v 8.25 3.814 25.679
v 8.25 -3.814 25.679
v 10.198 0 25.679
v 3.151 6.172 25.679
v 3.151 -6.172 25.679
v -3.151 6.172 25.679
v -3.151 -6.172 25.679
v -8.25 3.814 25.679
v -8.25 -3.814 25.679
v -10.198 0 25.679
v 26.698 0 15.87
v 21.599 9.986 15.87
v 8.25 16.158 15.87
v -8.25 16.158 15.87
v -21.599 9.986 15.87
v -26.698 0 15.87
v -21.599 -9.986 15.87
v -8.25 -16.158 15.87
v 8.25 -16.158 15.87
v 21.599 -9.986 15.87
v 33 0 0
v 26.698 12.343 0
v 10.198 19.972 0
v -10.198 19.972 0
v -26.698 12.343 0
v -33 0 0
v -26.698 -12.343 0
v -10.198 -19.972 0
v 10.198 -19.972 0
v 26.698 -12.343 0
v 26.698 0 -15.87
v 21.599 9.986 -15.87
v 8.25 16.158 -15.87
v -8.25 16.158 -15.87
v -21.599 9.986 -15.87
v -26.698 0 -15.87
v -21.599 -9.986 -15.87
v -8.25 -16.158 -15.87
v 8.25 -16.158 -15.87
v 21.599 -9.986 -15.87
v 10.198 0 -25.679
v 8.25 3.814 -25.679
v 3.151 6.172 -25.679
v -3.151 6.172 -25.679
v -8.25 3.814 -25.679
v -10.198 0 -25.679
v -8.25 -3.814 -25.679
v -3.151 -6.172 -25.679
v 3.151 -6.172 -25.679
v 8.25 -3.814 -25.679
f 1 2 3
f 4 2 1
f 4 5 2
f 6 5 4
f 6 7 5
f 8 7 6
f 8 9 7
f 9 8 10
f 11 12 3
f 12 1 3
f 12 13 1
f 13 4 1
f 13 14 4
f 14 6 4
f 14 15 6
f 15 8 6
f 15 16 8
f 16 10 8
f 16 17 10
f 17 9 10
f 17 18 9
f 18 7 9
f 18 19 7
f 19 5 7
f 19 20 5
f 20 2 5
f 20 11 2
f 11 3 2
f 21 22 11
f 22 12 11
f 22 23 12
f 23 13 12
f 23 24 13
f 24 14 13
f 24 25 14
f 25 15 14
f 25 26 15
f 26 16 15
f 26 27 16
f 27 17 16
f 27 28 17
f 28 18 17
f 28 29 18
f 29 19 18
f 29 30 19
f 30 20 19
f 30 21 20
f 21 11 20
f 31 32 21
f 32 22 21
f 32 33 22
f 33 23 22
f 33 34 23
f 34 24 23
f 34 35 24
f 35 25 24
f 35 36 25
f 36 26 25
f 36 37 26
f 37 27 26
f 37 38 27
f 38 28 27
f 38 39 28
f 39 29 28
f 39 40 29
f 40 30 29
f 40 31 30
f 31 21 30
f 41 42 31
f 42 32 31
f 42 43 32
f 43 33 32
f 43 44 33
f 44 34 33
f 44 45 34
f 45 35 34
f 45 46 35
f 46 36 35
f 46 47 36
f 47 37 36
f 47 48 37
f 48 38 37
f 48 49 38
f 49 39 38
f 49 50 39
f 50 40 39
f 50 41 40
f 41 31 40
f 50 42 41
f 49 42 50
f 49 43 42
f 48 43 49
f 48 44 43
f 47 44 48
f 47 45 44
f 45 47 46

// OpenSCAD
// Generated by SolidPython 1.0.1 on 2020-07-29 00:46:49


scale(v = [11, 7, 9]) {
	sphere(r = 3);
}
/***********************************************
*********      SolidPython code:      **********
************************************************
 
# import packages: SolidPython
from solid import *
from solid.utils import *
from itertools import chain, combinations, permutations


class Resize:

    def __init__(self, scad_file):
        self.scad_file = scad_file
        #self.scad_file = import_scad(scad_file)
        # cone/cylinder param:
        self.r1 = 0
        self.r2 = 0
        self.h = 0
        # rectangular prism param:
        self.w = 0
        self.l = 0
        # ellipse param:
        self.r = 0

    # import OpenScad code (file name corresponds to shape)


    # classify shape + parameters
    def assign(self, param1, param2, param3):
        if self.scad_file == 'cone.scad':
            self.r1 = param1
            self.r2 = param2
            self.h = param3
        elif self.scad_file == 'cylinder.scad':
            self.r1 = param1
            self.r2 = param2
            self.h = param3
        elif self.scad_file == 'rectangularPrism.scad':
            self.h = param1
            self.l = param2
            self.w = param3
        else:
            self.r = param1
            self.h = param2

    # resize parameters
    def iterate(self):
        x = range(3, 20, 2)
        i = 1
        if self.scad_file == 'cone.scad':
            tempList = list(permutations(x, 2))
            for temp in tempList:
                param1 = temp[0]
                param2 = temp[1]
                filepath = 'produced_scad_files/' + 'cone' + str(param1) + '_' + str(param2) + '_' + '.scad'
                scad_render_to_file(cylinder(h=param1, r1=param2, r2=0), filepath)

        elif self.scad_file == 'cylinder.scad':
            tempList = list(permutations(x, 3))
            for temp in tempList:
                param1 = temp[0]
                param2 = temp[1]
                filepath = 'produced_scad_files/' + 'cylinder' + str(param1) + '_' + str(param2) + '_' + '.scad'
                scad_render_to_file(cylinder(h=param1, r1=param2, r2=param2), filepath)

        elif self.scad_file == 'rectangularPrism.scad':
            tempList = list(permutations(x, 3))
            for temp in tempList:
                param1 = temp[0]
                param2 = temp[1]
                param3 = temp[2]
                filepath = 'produced_scad_files/' + 'rectangularPrism' + str(param1) + '_' + str(param2) + '_' + str(
                    param3) + '.scad'
                scad_render_to_file(cube(size=(param1, param2, param3)), filepath)

        elif self.scad_file == 'ellipse.scad':
            tempList = list(permutations(x, 4))
            for temp in tempList:
                param1 = temp[0]
                param2 = temp[1]
                param3 = temp[2]
                param4 = temp[3]
                filepath = 'produced_scad_files/' + 'ellipse' + str(param1) + '_' + str(param2) + '_' + str(param3) + '_' + str(param4) + '.scad'
                scad_render_to_file(scale([param1, param2, param3])(sphere(r=param4)), filepath)

    def render_to_scadfile(self):
        scad_render_to_file(scad, 'example.scad') 
 
************************************************/
